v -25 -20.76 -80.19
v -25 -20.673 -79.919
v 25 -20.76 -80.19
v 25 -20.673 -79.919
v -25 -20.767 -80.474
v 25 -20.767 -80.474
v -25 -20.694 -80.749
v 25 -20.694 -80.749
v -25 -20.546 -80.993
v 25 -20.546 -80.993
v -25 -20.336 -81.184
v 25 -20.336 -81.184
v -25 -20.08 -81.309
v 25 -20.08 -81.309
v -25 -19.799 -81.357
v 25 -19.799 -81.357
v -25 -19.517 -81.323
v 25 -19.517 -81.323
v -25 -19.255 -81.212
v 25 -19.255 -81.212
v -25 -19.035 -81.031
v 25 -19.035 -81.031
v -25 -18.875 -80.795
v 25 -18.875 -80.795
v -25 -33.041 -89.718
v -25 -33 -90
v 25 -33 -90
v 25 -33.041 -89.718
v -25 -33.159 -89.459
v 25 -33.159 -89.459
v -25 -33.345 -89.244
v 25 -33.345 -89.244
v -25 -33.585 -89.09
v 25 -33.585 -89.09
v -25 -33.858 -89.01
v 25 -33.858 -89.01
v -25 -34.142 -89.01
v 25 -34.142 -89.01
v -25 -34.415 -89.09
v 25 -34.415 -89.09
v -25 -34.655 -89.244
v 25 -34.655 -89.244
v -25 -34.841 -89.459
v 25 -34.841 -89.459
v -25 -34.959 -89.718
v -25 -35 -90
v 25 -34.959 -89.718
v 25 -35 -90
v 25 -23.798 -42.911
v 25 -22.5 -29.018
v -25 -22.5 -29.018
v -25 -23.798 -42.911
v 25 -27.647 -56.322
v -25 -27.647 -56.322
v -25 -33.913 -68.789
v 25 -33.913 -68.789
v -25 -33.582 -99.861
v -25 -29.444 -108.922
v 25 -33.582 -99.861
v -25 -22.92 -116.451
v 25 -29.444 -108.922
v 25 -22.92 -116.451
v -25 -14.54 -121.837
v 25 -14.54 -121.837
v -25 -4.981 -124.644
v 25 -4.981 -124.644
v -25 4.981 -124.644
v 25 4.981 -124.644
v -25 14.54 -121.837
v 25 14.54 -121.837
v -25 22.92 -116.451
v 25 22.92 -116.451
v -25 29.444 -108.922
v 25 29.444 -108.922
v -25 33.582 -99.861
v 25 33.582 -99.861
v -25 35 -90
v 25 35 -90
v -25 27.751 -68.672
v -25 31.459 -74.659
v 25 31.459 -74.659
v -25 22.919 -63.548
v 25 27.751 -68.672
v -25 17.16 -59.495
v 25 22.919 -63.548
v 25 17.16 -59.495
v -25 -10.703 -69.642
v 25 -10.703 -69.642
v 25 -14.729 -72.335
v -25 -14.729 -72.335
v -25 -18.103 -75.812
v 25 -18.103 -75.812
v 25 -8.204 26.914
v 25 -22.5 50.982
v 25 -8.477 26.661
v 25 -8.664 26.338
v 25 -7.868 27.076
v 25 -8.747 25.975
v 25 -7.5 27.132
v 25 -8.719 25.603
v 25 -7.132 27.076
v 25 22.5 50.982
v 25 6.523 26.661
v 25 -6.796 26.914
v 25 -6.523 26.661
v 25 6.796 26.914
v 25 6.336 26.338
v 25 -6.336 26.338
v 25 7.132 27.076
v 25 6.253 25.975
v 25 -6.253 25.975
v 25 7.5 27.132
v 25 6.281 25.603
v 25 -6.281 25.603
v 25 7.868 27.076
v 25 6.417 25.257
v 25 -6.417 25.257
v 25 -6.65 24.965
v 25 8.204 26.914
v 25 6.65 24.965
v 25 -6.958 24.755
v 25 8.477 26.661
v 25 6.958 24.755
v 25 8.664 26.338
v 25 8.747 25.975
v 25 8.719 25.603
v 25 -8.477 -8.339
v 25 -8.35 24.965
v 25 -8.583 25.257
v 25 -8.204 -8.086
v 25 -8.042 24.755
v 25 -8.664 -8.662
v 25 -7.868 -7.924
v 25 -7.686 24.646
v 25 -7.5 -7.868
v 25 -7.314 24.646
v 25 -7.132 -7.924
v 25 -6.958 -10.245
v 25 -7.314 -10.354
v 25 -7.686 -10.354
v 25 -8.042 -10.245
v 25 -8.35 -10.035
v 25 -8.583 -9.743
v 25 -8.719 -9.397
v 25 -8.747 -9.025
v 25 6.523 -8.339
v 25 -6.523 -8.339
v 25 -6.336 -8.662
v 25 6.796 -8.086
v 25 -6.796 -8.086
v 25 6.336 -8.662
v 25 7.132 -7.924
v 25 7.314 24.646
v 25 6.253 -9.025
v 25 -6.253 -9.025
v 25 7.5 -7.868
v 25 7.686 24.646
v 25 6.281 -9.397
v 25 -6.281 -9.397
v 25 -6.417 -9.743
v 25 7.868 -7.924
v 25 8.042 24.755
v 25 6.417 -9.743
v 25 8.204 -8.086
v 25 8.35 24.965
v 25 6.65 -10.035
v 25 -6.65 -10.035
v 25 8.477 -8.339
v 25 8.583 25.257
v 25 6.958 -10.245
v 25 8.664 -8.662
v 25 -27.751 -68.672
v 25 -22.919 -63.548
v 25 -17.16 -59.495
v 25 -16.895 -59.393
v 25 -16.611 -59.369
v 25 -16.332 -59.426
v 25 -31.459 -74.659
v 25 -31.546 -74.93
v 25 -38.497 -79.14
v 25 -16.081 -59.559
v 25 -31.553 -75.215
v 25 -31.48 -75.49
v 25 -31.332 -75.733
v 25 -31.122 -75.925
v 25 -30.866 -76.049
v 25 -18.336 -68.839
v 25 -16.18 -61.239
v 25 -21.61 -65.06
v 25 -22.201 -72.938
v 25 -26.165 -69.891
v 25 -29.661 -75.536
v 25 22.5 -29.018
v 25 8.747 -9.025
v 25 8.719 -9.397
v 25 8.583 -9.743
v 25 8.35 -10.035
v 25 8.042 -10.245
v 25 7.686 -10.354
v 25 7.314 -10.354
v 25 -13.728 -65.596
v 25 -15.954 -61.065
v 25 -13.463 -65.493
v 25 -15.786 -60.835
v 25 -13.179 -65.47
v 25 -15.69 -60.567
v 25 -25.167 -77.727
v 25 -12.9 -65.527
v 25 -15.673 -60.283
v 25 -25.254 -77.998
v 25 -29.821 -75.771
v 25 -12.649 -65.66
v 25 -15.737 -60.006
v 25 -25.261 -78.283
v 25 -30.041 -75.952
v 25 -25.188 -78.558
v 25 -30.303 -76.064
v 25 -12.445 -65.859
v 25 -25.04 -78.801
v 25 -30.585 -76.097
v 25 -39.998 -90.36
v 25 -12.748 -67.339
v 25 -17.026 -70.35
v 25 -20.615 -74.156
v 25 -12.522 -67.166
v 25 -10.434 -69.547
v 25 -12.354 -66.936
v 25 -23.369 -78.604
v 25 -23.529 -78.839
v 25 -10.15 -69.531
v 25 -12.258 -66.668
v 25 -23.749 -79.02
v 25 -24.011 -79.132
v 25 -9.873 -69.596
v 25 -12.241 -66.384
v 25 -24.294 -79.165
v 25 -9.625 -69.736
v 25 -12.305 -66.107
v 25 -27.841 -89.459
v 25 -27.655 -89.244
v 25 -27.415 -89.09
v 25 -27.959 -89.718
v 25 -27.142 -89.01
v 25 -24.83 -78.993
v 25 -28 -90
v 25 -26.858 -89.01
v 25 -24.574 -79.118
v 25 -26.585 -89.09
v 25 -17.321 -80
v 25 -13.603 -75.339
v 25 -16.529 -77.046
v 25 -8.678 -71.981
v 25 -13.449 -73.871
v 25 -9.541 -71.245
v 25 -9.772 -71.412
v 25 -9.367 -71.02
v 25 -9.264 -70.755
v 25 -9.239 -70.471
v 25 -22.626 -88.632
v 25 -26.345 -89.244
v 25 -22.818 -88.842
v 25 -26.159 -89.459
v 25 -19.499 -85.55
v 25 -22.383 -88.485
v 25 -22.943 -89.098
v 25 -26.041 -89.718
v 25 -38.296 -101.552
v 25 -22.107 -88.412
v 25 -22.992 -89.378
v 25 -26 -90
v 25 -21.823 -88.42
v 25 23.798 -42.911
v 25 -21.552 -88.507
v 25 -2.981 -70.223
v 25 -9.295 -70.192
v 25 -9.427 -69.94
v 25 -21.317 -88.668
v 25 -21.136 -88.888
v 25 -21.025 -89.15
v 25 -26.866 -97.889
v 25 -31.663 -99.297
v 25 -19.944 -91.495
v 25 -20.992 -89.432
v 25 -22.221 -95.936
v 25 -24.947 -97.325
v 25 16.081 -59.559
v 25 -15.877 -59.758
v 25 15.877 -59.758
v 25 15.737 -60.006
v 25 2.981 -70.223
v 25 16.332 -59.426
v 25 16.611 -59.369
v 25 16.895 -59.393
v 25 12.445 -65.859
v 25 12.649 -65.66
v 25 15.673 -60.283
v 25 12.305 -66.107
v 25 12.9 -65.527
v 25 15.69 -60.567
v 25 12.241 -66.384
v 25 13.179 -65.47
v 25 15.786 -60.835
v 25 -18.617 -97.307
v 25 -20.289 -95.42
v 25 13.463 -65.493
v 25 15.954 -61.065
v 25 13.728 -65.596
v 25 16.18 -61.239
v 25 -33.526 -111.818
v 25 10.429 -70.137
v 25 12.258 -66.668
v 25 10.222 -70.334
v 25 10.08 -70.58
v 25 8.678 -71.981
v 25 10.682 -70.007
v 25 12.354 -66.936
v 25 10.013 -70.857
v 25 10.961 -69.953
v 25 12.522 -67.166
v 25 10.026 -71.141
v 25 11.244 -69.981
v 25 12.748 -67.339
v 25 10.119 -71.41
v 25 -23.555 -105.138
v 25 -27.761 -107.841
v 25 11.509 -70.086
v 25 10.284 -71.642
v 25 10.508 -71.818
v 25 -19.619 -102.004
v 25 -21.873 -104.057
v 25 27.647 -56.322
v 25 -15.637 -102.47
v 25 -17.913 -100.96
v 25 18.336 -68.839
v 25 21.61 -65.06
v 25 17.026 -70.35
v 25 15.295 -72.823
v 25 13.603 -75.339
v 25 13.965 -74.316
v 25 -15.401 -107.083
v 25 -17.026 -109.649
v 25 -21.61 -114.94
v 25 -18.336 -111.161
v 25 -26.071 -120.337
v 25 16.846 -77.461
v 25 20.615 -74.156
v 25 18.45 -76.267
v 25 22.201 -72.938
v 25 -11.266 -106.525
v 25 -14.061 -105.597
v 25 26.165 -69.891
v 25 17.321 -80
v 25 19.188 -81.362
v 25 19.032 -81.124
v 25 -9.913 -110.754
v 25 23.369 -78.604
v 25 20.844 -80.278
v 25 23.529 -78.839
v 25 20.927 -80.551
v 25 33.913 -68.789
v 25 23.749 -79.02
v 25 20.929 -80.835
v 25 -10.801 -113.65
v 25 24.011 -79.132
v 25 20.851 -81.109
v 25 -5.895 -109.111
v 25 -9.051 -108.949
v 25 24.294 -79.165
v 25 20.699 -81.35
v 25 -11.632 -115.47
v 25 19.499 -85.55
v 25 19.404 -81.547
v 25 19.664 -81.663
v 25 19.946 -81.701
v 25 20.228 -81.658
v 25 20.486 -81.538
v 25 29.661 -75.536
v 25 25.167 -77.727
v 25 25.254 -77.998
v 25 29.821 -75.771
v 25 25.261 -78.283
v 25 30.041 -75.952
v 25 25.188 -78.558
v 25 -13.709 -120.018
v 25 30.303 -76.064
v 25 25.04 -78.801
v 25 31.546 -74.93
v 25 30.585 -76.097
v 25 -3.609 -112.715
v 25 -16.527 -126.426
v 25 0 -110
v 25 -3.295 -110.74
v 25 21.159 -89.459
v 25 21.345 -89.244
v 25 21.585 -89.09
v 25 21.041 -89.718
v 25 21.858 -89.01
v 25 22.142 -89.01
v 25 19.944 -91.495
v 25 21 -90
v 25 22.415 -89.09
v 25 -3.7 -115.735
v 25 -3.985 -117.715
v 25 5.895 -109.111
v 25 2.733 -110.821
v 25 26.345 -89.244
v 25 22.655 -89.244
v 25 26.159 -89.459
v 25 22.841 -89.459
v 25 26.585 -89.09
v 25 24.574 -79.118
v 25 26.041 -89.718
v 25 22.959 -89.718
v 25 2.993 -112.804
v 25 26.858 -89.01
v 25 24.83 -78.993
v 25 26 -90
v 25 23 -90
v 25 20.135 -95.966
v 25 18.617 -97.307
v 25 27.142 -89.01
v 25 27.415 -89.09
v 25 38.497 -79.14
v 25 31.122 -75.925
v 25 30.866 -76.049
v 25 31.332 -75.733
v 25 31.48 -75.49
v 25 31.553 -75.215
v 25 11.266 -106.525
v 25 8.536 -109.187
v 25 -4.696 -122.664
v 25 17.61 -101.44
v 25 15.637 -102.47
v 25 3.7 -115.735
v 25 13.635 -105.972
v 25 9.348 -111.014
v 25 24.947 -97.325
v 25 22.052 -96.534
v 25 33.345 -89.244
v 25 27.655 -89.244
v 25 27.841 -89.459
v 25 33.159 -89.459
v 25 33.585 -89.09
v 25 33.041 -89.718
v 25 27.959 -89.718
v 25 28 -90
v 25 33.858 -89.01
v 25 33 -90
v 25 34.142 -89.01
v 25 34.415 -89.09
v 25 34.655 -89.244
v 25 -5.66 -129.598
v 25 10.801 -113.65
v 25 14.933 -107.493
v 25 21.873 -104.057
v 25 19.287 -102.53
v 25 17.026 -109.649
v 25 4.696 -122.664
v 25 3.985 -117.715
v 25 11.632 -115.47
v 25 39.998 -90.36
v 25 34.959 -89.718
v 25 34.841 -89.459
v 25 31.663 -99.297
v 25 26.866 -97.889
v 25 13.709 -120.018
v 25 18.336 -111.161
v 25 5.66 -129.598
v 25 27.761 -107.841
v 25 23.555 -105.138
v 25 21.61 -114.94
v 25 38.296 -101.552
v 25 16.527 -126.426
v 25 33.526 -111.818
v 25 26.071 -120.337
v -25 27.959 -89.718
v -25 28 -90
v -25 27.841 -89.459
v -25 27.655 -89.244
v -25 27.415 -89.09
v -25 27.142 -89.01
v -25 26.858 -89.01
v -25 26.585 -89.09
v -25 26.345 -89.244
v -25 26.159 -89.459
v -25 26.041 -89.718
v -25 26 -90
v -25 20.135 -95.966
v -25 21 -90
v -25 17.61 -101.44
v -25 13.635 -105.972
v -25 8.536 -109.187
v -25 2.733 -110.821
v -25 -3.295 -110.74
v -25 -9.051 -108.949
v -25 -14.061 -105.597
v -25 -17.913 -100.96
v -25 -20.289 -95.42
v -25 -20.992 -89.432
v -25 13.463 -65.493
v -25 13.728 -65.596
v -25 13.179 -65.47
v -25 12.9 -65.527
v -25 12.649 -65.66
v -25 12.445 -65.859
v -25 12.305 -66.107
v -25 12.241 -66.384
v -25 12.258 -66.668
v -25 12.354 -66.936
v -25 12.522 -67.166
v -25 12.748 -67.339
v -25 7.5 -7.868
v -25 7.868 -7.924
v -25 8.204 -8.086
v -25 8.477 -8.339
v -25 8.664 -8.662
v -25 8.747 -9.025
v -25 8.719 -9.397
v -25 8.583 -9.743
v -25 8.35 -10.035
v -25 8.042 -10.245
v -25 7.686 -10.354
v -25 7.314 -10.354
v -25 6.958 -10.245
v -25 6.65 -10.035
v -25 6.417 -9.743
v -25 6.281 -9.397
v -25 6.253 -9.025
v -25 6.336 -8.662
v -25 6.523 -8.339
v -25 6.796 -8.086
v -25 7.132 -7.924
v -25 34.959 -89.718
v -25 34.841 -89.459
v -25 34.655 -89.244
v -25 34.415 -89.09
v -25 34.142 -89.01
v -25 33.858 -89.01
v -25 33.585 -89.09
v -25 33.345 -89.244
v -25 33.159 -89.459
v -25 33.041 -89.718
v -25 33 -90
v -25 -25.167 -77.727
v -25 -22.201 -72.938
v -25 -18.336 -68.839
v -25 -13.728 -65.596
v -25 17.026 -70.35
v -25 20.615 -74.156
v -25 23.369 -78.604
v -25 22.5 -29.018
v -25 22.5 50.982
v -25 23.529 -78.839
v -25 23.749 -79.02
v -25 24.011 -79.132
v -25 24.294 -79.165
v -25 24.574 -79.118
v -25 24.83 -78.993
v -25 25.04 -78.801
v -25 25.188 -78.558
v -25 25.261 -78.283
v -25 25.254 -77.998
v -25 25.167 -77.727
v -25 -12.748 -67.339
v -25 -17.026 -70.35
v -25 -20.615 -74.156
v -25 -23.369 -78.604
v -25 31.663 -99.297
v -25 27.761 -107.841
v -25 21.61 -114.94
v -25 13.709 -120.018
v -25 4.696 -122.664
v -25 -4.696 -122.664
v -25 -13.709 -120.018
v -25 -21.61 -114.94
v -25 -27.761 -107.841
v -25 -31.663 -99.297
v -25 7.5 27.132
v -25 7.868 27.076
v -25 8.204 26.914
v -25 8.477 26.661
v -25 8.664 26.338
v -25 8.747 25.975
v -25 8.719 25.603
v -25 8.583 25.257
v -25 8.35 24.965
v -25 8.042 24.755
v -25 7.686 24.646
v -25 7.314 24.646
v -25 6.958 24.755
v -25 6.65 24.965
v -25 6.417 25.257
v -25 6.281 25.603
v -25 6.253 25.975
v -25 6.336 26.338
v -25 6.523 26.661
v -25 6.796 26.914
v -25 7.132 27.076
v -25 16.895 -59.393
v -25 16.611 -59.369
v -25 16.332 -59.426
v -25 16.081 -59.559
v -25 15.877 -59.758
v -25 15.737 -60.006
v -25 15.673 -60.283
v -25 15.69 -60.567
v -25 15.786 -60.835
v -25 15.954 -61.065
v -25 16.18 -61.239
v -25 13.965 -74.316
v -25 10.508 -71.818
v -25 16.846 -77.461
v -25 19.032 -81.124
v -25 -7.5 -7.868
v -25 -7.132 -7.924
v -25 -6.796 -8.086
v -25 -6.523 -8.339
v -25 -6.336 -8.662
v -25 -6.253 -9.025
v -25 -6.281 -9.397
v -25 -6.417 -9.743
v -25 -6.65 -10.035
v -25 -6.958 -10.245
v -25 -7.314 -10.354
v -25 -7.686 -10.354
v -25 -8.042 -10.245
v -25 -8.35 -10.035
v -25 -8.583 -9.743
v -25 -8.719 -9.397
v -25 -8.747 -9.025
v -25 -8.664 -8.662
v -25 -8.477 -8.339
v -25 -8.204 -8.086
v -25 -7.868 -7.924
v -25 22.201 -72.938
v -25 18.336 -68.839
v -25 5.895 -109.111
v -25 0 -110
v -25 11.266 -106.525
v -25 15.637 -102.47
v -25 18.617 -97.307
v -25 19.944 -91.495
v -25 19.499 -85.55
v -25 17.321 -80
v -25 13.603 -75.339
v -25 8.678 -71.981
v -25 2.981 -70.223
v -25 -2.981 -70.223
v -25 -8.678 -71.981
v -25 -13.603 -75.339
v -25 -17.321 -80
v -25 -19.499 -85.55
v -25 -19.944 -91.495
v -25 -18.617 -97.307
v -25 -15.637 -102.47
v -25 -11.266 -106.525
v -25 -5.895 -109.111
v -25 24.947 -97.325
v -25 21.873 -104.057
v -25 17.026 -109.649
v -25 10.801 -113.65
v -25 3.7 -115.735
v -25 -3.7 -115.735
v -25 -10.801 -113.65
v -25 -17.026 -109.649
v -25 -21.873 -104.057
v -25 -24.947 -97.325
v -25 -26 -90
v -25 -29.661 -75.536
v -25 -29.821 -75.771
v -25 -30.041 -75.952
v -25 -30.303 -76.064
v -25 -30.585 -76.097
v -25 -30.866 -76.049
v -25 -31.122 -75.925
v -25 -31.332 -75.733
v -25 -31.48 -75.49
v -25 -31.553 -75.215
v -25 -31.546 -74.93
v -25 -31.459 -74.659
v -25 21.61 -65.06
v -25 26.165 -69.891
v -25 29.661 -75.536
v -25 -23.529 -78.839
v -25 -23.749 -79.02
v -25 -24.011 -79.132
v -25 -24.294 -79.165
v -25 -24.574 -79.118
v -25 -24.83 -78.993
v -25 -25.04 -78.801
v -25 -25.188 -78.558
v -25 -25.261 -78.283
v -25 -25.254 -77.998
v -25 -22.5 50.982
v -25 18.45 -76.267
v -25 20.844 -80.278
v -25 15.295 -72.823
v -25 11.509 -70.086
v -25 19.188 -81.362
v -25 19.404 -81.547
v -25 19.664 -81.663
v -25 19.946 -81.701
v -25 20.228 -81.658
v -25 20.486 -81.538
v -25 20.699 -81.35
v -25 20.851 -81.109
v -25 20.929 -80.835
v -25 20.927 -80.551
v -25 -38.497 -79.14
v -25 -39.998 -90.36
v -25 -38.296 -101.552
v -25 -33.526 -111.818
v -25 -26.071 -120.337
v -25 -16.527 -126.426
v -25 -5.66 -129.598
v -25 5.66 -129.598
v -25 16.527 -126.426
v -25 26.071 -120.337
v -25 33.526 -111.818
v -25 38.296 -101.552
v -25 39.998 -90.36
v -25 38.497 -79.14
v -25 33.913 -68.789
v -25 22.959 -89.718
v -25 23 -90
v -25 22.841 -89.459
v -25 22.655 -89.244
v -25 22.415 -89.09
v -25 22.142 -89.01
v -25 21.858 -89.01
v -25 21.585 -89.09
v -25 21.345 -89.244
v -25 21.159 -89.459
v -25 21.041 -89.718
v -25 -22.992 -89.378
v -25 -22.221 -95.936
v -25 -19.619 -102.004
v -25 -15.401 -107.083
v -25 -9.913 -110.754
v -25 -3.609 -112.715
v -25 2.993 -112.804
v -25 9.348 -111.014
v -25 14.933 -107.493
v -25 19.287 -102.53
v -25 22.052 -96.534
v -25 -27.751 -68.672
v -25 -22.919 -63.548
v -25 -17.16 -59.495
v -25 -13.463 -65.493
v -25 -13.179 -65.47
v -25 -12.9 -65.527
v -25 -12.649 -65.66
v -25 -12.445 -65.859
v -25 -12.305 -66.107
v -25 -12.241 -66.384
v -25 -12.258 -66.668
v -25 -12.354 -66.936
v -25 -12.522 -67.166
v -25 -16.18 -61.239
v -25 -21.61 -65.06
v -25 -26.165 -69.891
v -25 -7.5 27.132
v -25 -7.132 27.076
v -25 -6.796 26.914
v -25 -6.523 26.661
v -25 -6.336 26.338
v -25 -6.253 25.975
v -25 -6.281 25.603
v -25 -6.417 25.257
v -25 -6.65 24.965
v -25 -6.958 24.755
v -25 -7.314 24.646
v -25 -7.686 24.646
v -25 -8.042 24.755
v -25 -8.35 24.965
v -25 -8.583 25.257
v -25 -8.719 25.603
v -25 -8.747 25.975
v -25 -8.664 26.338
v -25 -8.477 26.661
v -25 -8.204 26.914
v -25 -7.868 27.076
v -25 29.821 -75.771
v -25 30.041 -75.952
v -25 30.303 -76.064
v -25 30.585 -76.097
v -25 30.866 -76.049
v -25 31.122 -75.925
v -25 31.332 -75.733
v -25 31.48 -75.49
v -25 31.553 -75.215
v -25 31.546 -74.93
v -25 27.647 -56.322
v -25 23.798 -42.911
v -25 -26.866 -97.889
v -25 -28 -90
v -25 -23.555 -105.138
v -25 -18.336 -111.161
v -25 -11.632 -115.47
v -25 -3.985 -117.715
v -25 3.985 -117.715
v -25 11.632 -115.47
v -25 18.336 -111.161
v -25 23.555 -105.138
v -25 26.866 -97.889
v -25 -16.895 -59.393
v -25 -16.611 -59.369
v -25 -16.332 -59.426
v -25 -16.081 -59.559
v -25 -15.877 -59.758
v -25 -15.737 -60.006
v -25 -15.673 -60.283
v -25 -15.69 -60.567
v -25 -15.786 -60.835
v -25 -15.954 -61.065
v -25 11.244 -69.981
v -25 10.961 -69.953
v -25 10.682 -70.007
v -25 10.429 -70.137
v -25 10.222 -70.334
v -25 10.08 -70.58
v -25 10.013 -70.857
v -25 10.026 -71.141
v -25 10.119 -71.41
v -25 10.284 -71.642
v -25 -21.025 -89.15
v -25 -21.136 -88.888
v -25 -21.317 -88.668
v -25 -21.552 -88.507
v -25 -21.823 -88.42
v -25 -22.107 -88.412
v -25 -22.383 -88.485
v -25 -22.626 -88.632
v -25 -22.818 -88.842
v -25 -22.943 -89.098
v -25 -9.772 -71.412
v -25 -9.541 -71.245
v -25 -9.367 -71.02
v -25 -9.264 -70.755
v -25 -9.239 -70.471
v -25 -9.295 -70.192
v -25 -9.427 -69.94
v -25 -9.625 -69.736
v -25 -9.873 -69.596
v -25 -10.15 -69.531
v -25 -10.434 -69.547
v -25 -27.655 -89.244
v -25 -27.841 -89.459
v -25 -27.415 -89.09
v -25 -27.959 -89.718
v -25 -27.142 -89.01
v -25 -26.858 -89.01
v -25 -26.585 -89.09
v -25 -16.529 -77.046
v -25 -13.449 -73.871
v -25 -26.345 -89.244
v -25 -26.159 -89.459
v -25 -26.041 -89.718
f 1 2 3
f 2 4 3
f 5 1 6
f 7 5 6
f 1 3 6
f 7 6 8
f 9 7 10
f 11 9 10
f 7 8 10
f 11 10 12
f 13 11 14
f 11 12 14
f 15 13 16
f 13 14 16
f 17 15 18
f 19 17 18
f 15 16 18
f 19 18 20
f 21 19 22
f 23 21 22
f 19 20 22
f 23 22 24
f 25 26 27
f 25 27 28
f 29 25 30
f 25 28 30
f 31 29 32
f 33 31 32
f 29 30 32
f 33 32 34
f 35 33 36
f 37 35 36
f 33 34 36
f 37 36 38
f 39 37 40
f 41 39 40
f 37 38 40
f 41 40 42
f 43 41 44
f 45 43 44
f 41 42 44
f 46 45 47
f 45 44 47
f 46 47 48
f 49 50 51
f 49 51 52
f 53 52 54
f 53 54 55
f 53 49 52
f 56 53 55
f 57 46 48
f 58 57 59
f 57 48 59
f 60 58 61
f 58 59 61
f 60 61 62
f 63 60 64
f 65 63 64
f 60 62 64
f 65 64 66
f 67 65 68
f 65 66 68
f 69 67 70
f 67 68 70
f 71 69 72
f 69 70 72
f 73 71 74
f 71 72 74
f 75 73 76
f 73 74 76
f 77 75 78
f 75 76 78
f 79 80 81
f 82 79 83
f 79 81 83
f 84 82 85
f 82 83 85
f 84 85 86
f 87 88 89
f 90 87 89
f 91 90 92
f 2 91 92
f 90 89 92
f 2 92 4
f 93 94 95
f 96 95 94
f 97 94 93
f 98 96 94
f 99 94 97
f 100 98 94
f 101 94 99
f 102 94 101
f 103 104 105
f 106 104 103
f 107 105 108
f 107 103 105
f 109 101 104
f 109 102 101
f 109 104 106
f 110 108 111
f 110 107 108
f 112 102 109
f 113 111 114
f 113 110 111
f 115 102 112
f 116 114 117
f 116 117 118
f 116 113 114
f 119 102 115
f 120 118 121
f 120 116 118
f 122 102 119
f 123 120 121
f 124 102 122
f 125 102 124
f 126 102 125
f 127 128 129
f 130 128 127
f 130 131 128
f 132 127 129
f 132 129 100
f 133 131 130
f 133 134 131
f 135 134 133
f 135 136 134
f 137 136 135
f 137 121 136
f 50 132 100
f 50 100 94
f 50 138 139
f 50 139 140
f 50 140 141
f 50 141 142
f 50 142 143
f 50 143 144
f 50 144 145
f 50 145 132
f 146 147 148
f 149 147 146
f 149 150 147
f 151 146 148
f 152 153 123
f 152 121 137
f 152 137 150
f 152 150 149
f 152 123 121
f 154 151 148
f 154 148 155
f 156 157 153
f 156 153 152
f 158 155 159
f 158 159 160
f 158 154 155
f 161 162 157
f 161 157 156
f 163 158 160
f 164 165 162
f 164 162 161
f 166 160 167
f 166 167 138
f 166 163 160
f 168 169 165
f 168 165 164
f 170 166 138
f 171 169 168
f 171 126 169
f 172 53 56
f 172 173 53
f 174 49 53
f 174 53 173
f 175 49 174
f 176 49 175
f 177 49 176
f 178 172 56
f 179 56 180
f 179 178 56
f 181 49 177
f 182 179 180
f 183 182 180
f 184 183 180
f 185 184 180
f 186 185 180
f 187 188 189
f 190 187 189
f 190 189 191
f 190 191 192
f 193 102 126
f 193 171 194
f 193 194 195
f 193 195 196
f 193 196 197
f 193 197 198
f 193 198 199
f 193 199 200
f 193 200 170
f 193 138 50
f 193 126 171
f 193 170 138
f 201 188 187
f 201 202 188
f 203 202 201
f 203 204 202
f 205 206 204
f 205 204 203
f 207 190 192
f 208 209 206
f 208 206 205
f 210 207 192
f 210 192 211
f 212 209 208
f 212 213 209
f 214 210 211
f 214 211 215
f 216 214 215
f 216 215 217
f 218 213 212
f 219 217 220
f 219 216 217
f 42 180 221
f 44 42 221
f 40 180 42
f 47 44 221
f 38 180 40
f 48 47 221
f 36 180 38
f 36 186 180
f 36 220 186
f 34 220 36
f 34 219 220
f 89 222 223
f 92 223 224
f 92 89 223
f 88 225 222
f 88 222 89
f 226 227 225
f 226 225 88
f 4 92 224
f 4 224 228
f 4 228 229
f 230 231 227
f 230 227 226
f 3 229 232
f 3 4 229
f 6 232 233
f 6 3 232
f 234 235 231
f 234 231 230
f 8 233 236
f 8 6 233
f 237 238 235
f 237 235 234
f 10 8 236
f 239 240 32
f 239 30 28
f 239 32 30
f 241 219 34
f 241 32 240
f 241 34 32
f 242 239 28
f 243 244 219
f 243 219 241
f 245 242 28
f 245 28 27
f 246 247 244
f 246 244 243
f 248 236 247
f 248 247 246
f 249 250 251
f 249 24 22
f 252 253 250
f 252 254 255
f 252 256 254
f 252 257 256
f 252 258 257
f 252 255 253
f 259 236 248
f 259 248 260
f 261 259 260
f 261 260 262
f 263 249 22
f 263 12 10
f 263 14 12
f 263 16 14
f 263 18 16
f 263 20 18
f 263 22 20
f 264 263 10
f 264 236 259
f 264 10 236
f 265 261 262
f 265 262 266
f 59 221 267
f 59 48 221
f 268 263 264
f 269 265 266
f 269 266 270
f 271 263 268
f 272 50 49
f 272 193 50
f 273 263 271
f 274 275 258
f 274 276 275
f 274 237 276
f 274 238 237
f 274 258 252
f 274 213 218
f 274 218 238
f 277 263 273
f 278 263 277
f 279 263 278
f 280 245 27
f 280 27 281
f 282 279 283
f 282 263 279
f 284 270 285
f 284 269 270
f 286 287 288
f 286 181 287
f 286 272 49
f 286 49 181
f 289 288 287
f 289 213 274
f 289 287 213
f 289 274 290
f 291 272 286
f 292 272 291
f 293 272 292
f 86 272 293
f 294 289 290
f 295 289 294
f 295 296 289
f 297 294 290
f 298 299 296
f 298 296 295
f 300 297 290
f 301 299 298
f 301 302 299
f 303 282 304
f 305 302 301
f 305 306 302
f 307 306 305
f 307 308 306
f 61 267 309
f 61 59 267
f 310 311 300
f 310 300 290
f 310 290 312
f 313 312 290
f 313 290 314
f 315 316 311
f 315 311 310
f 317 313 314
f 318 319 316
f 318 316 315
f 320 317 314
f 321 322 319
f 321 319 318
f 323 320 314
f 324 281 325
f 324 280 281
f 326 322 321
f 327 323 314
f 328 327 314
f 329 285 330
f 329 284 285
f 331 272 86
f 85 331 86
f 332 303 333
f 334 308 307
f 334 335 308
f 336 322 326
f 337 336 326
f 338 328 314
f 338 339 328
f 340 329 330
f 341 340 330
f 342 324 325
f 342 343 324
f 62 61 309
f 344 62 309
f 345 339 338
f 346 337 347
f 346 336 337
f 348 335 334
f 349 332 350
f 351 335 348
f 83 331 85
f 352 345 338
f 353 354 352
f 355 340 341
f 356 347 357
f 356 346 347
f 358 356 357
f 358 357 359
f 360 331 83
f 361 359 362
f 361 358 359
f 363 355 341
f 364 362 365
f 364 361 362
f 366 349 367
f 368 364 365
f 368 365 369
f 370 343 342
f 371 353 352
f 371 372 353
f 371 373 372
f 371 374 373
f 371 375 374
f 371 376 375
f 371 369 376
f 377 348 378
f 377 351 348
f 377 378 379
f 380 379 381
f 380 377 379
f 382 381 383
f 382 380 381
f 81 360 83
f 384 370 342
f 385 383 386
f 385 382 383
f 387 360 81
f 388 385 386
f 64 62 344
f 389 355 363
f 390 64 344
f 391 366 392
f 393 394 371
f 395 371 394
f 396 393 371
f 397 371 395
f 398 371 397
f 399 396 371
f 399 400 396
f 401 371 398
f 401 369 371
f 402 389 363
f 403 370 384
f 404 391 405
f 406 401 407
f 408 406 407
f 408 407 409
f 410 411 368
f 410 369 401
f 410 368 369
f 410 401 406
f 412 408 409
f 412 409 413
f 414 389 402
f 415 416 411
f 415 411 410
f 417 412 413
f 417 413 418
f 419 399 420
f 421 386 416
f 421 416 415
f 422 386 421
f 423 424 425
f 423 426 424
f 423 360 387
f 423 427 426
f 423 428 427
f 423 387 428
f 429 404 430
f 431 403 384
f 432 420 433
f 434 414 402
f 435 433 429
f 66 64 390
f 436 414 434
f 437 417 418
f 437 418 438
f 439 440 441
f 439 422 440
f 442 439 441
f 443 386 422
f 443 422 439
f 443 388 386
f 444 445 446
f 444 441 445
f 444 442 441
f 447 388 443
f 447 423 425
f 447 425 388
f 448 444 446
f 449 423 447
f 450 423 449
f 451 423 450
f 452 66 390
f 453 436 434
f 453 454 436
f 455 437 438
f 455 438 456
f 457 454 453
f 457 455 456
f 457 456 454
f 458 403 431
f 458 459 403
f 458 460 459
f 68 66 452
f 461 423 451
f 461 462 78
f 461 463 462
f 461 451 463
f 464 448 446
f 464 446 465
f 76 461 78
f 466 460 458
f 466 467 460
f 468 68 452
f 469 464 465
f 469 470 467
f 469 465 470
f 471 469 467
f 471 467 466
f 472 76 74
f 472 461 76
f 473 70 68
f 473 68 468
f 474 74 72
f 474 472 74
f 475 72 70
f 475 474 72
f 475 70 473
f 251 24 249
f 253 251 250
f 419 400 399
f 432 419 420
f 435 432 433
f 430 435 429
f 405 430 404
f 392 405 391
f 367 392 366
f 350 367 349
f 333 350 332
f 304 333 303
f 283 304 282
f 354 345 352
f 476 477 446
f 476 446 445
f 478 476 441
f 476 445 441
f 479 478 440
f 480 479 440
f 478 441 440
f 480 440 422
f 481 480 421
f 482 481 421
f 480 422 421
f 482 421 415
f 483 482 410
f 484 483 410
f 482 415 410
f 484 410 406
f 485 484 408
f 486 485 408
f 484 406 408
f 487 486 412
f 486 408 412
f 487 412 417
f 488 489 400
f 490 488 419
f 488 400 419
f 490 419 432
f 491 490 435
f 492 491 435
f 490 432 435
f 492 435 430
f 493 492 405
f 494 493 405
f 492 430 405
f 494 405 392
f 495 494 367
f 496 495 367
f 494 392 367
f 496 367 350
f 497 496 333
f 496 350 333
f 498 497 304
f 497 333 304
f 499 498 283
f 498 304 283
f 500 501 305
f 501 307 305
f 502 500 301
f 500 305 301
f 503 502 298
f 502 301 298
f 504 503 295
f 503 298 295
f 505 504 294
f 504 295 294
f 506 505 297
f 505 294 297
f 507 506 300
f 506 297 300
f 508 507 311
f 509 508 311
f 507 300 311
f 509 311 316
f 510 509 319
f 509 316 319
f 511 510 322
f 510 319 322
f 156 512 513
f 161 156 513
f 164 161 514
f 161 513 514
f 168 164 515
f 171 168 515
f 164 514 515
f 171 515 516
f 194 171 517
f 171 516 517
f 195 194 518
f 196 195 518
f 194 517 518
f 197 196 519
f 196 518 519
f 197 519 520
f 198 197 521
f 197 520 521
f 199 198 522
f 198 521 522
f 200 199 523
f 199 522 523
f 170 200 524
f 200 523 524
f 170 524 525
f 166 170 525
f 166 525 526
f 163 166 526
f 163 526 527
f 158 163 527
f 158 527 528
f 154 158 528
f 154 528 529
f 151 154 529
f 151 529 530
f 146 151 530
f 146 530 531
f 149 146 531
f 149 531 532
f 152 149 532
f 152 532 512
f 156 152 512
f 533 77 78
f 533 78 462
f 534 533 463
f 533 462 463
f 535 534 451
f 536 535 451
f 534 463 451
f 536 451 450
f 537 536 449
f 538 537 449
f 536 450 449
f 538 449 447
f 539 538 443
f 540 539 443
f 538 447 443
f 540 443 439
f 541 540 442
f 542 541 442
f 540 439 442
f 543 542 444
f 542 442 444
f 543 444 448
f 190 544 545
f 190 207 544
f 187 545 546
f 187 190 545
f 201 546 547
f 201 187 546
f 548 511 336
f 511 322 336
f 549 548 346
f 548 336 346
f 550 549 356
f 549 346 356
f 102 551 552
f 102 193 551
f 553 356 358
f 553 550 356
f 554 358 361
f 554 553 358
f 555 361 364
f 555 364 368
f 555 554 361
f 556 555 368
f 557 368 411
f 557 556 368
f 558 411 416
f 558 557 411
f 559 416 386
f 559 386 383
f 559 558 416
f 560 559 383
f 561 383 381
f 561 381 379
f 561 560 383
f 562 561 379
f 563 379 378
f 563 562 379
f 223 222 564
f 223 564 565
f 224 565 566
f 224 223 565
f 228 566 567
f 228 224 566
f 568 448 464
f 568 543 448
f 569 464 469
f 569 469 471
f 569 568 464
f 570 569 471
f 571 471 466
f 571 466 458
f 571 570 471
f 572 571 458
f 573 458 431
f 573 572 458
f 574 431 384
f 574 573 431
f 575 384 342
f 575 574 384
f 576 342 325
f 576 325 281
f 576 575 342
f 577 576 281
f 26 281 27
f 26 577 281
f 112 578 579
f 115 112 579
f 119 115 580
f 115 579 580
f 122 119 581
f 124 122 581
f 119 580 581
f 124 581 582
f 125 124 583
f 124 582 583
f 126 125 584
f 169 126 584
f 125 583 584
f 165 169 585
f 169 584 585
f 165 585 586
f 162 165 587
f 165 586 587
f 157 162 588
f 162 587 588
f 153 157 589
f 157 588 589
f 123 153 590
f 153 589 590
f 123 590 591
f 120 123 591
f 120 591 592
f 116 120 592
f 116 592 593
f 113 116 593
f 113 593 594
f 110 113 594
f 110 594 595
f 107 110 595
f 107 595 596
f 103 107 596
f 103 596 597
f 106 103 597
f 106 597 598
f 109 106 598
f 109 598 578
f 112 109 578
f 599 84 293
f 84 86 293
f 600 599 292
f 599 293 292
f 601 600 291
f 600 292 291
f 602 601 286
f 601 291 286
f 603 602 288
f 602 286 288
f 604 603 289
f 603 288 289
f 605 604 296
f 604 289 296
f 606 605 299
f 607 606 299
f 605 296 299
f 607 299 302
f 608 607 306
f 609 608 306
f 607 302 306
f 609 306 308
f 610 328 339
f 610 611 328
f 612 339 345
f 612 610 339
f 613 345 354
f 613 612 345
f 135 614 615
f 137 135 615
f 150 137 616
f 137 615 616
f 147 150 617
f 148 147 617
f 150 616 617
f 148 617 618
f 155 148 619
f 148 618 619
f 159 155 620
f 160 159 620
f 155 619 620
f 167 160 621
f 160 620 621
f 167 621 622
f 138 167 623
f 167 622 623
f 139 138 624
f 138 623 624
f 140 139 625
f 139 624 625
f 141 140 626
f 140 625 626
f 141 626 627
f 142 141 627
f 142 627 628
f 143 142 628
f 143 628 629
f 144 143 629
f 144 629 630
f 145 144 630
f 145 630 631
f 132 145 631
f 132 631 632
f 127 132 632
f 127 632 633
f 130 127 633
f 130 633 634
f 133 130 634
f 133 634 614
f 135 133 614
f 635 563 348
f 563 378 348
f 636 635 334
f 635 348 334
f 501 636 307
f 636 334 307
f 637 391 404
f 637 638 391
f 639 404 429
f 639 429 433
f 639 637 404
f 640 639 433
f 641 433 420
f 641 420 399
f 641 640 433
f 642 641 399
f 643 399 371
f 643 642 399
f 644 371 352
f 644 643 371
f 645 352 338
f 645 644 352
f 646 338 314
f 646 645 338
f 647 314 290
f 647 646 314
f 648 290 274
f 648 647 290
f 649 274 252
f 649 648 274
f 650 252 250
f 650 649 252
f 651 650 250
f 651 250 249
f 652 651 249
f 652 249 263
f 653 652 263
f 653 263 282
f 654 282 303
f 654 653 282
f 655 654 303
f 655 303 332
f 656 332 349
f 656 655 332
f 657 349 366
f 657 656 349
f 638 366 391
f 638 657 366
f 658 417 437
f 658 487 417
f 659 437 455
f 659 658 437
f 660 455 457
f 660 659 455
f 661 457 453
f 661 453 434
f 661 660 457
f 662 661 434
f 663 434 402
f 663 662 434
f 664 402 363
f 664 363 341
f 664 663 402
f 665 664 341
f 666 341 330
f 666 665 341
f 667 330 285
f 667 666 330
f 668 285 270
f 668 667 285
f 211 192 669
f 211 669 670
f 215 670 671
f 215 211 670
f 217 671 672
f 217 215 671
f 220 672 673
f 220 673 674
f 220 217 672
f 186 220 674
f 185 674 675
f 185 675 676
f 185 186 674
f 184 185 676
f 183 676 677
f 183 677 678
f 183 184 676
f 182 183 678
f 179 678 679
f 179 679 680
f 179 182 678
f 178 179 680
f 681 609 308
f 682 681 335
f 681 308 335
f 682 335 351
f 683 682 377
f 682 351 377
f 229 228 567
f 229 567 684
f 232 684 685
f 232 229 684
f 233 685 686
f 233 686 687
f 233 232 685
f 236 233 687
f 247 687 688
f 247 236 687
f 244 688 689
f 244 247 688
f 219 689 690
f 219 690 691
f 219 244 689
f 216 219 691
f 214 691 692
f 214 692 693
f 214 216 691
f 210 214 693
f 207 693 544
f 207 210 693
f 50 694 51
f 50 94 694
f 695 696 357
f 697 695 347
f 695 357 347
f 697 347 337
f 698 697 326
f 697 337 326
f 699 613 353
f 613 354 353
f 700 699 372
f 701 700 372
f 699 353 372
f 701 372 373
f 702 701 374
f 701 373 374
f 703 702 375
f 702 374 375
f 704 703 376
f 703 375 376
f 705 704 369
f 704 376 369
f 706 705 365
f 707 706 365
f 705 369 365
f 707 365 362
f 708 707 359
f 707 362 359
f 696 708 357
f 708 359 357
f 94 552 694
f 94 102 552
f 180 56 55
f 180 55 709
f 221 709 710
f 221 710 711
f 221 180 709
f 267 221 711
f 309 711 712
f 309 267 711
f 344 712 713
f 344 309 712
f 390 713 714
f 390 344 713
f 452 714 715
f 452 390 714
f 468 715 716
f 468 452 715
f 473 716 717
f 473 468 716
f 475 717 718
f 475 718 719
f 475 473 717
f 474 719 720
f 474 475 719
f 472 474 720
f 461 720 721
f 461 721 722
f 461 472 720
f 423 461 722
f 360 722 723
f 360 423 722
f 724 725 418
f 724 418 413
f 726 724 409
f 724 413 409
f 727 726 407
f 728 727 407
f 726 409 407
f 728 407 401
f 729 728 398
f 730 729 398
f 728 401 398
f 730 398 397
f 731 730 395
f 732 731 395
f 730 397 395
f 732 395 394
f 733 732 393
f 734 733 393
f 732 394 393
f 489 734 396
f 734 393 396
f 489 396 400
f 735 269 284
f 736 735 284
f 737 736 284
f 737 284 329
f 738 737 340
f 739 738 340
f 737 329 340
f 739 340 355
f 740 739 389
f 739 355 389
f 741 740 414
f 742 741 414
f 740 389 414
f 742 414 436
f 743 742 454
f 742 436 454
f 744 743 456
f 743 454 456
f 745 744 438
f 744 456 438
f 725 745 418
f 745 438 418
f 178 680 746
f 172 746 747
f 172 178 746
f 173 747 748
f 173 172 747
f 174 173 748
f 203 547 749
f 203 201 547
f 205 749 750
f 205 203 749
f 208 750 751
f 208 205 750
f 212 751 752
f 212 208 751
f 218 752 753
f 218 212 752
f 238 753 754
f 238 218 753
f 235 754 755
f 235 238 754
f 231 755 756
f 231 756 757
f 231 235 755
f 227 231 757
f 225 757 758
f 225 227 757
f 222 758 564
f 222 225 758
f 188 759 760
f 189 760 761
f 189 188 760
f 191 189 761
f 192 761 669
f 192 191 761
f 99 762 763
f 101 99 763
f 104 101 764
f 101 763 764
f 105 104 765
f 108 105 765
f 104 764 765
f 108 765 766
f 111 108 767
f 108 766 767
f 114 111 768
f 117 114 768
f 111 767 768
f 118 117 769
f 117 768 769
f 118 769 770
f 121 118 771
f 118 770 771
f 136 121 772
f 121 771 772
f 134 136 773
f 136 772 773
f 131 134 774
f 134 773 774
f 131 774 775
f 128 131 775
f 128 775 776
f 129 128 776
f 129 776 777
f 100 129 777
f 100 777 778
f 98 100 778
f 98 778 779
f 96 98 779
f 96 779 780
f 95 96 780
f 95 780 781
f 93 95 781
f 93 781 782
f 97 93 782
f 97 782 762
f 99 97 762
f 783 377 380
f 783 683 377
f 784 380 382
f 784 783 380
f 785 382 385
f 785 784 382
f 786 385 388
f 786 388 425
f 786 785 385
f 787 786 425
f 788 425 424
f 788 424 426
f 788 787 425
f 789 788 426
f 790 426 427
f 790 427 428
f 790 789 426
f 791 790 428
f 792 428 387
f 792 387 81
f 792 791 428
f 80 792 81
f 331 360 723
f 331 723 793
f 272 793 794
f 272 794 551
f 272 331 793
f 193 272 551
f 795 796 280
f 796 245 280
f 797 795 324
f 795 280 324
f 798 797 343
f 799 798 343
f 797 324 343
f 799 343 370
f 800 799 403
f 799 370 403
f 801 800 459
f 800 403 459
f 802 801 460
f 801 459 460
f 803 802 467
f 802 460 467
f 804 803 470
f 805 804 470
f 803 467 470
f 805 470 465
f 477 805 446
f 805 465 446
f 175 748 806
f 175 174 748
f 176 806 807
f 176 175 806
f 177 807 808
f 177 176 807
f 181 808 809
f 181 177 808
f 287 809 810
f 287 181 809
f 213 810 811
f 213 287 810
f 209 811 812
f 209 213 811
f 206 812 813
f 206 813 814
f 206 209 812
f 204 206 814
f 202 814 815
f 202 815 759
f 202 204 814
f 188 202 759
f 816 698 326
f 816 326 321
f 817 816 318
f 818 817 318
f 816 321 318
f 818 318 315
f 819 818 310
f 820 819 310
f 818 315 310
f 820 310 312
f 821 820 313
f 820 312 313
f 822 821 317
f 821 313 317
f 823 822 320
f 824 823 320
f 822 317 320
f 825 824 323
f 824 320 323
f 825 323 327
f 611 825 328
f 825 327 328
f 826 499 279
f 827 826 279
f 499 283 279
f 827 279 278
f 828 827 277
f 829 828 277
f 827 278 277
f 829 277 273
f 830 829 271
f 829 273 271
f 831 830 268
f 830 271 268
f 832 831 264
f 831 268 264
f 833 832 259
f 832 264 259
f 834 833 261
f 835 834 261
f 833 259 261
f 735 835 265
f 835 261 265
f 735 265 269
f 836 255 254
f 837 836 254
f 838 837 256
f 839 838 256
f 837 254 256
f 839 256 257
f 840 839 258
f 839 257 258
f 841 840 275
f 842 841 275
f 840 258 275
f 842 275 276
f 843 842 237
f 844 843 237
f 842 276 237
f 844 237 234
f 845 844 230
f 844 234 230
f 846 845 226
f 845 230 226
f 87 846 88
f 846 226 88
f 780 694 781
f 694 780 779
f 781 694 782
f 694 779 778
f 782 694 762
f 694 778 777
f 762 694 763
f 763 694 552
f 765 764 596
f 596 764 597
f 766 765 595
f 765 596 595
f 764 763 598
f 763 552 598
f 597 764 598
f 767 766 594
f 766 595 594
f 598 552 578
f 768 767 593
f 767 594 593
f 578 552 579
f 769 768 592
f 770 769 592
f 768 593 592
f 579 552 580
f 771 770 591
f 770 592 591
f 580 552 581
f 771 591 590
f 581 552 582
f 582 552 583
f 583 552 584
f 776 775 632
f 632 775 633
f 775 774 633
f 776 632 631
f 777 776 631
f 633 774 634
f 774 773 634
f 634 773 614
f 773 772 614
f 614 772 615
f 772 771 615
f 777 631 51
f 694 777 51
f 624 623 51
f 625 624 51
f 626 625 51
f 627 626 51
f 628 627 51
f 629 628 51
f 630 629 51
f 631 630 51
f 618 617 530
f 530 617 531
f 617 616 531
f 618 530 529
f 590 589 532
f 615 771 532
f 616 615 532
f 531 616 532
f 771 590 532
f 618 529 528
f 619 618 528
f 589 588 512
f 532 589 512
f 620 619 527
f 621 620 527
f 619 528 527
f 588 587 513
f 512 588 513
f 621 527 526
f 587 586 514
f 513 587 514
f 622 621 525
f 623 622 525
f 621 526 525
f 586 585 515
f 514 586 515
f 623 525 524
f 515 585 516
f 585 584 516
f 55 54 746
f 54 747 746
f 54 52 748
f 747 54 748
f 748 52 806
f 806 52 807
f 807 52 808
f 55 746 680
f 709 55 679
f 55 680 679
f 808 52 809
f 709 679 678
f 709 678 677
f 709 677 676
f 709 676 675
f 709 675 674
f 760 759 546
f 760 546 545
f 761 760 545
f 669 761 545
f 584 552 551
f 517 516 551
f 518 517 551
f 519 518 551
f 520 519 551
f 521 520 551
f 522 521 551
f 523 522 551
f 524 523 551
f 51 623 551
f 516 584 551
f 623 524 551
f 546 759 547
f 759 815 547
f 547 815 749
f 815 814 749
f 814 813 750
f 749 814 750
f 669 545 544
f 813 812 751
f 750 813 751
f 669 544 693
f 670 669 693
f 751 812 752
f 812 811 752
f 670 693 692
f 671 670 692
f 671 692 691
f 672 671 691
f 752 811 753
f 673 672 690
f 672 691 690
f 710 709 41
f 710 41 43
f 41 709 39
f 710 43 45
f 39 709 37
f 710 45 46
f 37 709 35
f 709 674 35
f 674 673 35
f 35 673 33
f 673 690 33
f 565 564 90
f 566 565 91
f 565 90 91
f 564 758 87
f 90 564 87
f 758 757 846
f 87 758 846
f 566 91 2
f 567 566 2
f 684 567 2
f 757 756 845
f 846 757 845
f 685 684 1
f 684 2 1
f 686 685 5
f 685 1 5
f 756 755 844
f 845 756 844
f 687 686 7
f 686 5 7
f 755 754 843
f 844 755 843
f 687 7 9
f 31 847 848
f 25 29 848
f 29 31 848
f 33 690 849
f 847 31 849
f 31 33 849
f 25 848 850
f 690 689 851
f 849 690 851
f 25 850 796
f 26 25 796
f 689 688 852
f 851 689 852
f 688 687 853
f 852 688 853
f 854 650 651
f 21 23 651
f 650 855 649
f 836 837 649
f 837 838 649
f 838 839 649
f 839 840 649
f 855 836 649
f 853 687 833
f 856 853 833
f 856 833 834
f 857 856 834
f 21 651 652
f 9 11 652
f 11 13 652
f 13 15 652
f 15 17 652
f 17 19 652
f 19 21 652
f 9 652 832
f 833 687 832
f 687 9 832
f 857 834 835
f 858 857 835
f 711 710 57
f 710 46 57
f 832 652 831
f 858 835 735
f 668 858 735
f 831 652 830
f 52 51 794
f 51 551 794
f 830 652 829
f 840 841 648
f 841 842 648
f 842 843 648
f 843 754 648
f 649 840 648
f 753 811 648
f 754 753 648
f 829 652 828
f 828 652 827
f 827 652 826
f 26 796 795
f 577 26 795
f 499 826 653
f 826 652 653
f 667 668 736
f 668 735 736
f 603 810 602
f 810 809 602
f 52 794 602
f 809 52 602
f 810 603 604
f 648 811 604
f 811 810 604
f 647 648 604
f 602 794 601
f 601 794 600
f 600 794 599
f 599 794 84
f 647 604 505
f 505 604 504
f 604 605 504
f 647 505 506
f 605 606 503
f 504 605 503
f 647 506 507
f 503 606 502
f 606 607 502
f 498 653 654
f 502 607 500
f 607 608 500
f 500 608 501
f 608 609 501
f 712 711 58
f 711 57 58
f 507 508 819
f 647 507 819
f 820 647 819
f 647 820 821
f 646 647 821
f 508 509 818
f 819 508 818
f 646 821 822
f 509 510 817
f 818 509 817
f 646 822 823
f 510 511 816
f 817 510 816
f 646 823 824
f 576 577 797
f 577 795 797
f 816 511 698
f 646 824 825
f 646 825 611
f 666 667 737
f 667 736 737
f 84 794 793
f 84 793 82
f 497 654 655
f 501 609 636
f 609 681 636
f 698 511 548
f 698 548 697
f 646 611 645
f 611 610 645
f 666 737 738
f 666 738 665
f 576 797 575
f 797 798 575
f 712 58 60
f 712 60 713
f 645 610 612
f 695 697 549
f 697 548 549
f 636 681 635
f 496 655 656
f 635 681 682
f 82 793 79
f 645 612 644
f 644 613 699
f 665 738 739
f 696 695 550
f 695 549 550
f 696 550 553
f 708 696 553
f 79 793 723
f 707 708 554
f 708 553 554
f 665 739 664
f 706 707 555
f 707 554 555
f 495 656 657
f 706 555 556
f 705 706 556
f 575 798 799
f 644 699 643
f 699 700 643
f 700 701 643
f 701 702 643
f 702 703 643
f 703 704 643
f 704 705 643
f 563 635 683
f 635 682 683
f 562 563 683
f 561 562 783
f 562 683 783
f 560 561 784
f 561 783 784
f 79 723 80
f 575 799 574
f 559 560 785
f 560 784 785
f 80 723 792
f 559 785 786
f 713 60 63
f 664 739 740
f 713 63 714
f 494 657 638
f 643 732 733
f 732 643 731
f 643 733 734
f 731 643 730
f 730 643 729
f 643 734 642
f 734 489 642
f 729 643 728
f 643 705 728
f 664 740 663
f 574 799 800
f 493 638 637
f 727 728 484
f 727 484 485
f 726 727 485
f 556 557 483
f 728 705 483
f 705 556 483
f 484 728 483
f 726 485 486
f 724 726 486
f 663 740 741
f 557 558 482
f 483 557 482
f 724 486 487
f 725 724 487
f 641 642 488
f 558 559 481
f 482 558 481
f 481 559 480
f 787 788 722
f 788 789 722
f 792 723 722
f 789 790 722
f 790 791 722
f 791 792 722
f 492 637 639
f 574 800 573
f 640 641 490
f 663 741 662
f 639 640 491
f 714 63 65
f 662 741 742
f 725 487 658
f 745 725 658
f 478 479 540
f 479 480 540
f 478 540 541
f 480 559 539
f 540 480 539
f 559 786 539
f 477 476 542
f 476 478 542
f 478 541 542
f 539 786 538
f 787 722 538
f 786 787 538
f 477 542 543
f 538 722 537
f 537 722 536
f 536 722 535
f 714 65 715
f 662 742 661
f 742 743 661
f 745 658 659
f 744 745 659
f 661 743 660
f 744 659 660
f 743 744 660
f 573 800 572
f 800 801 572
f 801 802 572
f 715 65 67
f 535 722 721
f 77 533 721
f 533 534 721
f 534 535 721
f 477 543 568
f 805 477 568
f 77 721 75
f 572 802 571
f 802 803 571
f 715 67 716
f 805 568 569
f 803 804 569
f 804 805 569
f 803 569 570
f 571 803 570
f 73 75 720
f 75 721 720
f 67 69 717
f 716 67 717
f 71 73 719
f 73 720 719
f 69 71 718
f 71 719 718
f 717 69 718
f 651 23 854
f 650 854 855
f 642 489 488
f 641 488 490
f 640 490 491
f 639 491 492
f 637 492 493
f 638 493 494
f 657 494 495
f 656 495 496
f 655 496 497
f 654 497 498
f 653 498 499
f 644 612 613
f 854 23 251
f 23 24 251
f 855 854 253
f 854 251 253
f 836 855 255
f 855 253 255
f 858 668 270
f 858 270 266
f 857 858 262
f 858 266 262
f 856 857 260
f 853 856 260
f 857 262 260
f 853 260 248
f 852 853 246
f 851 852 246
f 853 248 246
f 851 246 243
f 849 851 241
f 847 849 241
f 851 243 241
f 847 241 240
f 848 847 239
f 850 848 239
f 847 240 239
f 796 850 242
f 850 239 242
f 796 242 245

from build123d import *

# Parameters (mm, degrees)
ESBO_O2_R                = 20
RESSALTO_EXTRUS_O1_DEPTH = 25
ESBO_O3_R                = 1.25
CORTE_EXTRUS_O1_DEPTH    = 145.913767462


with BuildPart() as part:
    # Esboço2 → Ressalto-extrusão1 (new, symmetric)
    with BuildSketch(Plane(origin=(0, 0, 0), x_dir=(0, 0, -1), z_dir=(1, 0, 0))):
        with BuildLine():
            Line((-50.981554588, -22.5), (29.018445412, -22.5))
            ThreePointArc((29.018445412, -22.5), (49.706343576, -25.409703361), (68.789024491, -33.913043478))
            ThreePointArc((68.789024491, -33.913043478), (130, 0), (68.789024491, 33.913043478))
            ThreePointArc((68.789024491, 33.913043478), (49.706343576, 25.409703361), (29.018445412, 22.5))
            Line((29.018445412, 22.5), (-50.981554588, 22.5))
            Line((-50.981554588, 22.5), (-50.981554588, -22.5))
        make_face()
        with Locations((90, 0)):
            Circle(ESBO_O2_R, mode=Mode.SUBTRACT)
        with BuildLine():
            ThreePointArc((67.339434728, -12.747500993), (72.162673174, -18.916388971), (78.603905138, -23.369403542))
            ThreePointArc((78.603905138, -23.369403542), (79.064417011, -24.706538096), (77.727282457, -25.167049968))
            ThreePointArc((77.727282457, -25.167049968), (70.79057111, -20.371495815), (65.596314323, -13.728077992))
            ThreePointArc((65.596314323, -13.728077992), (65.977586026, -12.36622929), (67.339434728, -12.747500993))
        make_face(mode=Mode.SUBTRACT)
        with BuildLine():
            ThreePointArc((61.238513309, -16.179520491), (67.360315951, -24.009262924), (75.535725753, -29.661166034))
            ThreePointArc((75.535725753, -29.661166034), (75.996237625, -30.998300588), (74.659103071, -31.45881246))
            ThreePointArc((74.659103071, -31.45881246), (65.988213888, -25.464369768), (59.495392903, -17.16009749))
            ThreePointArc((59.495392903, -17.16009749), (59.876664606, -15.798248788), (61.238513309, -16.179520491))
        make_face(mode=Mode.SUBTRACT)
        with BuildLine():
            ThreePointArc((59.495392903, 17.16009749), (59.876664606, 15.798248788), (61.238513309, 16.179520491))
            ThreePointArc((61.238513309, 16.179520491), (67.360315951, 24.009262924), (75.535725753, 29.661166034))
            ThreePointArc((75.535725753, 29.661166034), (75.996237625, 30.998300588), (74.659103071, 31.45881246))
            ThreePointArc((74.659103071, 31.45881246), (65.988213888, 25.464369768), (59.495392903, 17.16009749))
        make_face(mode=Mode.SUBTRACT)
        with BuildLine():
            ThreePointArc((65.596314323, 13.728077992), (65.977586026, 12.36622929), (67.339434728, 12.747500993))
            ThreePointArc((67.339434728, 12.747500993), (72.162673174, 18.916388971), (78.603905138, 23.369403542))
            ThreePointArc((78.603905138, 23.369403542), (79.064417011, 24.706538096), (77.727282457, 25.167049968))
            ThreePointArc((77.727282457, 25.167049968), (70.79057111, 20.371495815), (65.596314323, 13.728077992))
        make_face(mode=Mode.SUBTRACT)
        with BuildLine():
            ThreePointArc((90, -35), (125, 0), (90, 35))
            ThreePointArc((90, 35), (89, 34), (90, 33))
            ThreePointArc((90, 33), (123, 0), (90, -33))
            ThreePointArc((90, -33), (89, -34), (90, -35))
        make_face(mode=Mode.SUBTRACT)
        with BuildLine():
            ThreePointArc((90, -28), (118, 0), (90, 28))
            ThreePointArc((90, 28), (89, 27), (90, 26))
            ThreePointArc((90, 26), (116, 0), (90, -26))
            ThreePointArc((90, -26), (89, -27), (90, -28))
        make_face(mode=Mode.SUBTRACT)
        with BuildLine():
            ThreePointArc((80.278403844, 20.844437344), (74.464540757, 16.960233079), (70.086402165, 11.508632467))
            ThreePointArc((70.086402165, 11.508632467), (70.451835442, 10.142448541), (71.818019368, 10.507881818))
            ThreePointArc((71.818019368, 10.507881818), (75.815450256, 15.485430203), (81.123760031, 19.031877575))
            ThreePointArc((81.123760031, 19.031877575), (81.607361822, 20.360835553), (80.278403844, 20.844437344))
        make_face(mode=Mode.SUBTRACT)
        with BuildLine():
            ThreePointArc((69.641858511, -10.702620013), (73.984708204, -16.507889892), (79.918839161, -20.672933902))
            ThreePointArc((79.918839161, -20.672933902), (81.255973715, -20.21242203), (80.795461843, -18.875287476))
            ThreePointArc((80.795461843, -18.875287476), (75.377342273, -15.072421206), (71.412131684, -9.771957403))
            ThreePointArc((71.412131684, -9.771957403), (70.061663793, -9.352152121), (69.641858511, -10.702620013))
        make_face(mode=Mode.SUBTRACT)
        with BuildLine():
            ThreePointArc((89.378360714, -22.991597696), (112.997899328, -0.310848034), (90, 23))
            ThreePointArc((90, 23), (89, 22), (90, 21))
            ThreePointArc((90, 21), (110.998081995, -0.28381777), (89.432416304, -20.992328331))
            ThreePointArc((89.432416304, -20.992328331), (88.405753826, -21.964935218), (89.378360714, -22.991597696))
        make_face(mode=Mode.SUBTRACT)
    extrude(amount=RESSALTO_EXTRUS_O1_DEPTH, both=True)

    # Esboço3 → Corte-extrusão1 (cut, through all)
    with BuildSketch(Plane.ZY.offset(25)):
        with Locations((25.881554588, 7.5)):
            Circle(ESBO_O3_R)
        with Locations((-9.118445412, 7.5)):
            Circle(ESBO_O3_R)
        with Locations((-9.118445412, -7.5)):
            Circle(ESBO_O3_R)
        with Locations((25.881554588, -7.5)):
            Circle(ESBO_O3_R)
    extrude(amount=-CORTE_EXTRUS_O1_DEPTH, mode=Mode.SUBTRACT)


solid = part.part
